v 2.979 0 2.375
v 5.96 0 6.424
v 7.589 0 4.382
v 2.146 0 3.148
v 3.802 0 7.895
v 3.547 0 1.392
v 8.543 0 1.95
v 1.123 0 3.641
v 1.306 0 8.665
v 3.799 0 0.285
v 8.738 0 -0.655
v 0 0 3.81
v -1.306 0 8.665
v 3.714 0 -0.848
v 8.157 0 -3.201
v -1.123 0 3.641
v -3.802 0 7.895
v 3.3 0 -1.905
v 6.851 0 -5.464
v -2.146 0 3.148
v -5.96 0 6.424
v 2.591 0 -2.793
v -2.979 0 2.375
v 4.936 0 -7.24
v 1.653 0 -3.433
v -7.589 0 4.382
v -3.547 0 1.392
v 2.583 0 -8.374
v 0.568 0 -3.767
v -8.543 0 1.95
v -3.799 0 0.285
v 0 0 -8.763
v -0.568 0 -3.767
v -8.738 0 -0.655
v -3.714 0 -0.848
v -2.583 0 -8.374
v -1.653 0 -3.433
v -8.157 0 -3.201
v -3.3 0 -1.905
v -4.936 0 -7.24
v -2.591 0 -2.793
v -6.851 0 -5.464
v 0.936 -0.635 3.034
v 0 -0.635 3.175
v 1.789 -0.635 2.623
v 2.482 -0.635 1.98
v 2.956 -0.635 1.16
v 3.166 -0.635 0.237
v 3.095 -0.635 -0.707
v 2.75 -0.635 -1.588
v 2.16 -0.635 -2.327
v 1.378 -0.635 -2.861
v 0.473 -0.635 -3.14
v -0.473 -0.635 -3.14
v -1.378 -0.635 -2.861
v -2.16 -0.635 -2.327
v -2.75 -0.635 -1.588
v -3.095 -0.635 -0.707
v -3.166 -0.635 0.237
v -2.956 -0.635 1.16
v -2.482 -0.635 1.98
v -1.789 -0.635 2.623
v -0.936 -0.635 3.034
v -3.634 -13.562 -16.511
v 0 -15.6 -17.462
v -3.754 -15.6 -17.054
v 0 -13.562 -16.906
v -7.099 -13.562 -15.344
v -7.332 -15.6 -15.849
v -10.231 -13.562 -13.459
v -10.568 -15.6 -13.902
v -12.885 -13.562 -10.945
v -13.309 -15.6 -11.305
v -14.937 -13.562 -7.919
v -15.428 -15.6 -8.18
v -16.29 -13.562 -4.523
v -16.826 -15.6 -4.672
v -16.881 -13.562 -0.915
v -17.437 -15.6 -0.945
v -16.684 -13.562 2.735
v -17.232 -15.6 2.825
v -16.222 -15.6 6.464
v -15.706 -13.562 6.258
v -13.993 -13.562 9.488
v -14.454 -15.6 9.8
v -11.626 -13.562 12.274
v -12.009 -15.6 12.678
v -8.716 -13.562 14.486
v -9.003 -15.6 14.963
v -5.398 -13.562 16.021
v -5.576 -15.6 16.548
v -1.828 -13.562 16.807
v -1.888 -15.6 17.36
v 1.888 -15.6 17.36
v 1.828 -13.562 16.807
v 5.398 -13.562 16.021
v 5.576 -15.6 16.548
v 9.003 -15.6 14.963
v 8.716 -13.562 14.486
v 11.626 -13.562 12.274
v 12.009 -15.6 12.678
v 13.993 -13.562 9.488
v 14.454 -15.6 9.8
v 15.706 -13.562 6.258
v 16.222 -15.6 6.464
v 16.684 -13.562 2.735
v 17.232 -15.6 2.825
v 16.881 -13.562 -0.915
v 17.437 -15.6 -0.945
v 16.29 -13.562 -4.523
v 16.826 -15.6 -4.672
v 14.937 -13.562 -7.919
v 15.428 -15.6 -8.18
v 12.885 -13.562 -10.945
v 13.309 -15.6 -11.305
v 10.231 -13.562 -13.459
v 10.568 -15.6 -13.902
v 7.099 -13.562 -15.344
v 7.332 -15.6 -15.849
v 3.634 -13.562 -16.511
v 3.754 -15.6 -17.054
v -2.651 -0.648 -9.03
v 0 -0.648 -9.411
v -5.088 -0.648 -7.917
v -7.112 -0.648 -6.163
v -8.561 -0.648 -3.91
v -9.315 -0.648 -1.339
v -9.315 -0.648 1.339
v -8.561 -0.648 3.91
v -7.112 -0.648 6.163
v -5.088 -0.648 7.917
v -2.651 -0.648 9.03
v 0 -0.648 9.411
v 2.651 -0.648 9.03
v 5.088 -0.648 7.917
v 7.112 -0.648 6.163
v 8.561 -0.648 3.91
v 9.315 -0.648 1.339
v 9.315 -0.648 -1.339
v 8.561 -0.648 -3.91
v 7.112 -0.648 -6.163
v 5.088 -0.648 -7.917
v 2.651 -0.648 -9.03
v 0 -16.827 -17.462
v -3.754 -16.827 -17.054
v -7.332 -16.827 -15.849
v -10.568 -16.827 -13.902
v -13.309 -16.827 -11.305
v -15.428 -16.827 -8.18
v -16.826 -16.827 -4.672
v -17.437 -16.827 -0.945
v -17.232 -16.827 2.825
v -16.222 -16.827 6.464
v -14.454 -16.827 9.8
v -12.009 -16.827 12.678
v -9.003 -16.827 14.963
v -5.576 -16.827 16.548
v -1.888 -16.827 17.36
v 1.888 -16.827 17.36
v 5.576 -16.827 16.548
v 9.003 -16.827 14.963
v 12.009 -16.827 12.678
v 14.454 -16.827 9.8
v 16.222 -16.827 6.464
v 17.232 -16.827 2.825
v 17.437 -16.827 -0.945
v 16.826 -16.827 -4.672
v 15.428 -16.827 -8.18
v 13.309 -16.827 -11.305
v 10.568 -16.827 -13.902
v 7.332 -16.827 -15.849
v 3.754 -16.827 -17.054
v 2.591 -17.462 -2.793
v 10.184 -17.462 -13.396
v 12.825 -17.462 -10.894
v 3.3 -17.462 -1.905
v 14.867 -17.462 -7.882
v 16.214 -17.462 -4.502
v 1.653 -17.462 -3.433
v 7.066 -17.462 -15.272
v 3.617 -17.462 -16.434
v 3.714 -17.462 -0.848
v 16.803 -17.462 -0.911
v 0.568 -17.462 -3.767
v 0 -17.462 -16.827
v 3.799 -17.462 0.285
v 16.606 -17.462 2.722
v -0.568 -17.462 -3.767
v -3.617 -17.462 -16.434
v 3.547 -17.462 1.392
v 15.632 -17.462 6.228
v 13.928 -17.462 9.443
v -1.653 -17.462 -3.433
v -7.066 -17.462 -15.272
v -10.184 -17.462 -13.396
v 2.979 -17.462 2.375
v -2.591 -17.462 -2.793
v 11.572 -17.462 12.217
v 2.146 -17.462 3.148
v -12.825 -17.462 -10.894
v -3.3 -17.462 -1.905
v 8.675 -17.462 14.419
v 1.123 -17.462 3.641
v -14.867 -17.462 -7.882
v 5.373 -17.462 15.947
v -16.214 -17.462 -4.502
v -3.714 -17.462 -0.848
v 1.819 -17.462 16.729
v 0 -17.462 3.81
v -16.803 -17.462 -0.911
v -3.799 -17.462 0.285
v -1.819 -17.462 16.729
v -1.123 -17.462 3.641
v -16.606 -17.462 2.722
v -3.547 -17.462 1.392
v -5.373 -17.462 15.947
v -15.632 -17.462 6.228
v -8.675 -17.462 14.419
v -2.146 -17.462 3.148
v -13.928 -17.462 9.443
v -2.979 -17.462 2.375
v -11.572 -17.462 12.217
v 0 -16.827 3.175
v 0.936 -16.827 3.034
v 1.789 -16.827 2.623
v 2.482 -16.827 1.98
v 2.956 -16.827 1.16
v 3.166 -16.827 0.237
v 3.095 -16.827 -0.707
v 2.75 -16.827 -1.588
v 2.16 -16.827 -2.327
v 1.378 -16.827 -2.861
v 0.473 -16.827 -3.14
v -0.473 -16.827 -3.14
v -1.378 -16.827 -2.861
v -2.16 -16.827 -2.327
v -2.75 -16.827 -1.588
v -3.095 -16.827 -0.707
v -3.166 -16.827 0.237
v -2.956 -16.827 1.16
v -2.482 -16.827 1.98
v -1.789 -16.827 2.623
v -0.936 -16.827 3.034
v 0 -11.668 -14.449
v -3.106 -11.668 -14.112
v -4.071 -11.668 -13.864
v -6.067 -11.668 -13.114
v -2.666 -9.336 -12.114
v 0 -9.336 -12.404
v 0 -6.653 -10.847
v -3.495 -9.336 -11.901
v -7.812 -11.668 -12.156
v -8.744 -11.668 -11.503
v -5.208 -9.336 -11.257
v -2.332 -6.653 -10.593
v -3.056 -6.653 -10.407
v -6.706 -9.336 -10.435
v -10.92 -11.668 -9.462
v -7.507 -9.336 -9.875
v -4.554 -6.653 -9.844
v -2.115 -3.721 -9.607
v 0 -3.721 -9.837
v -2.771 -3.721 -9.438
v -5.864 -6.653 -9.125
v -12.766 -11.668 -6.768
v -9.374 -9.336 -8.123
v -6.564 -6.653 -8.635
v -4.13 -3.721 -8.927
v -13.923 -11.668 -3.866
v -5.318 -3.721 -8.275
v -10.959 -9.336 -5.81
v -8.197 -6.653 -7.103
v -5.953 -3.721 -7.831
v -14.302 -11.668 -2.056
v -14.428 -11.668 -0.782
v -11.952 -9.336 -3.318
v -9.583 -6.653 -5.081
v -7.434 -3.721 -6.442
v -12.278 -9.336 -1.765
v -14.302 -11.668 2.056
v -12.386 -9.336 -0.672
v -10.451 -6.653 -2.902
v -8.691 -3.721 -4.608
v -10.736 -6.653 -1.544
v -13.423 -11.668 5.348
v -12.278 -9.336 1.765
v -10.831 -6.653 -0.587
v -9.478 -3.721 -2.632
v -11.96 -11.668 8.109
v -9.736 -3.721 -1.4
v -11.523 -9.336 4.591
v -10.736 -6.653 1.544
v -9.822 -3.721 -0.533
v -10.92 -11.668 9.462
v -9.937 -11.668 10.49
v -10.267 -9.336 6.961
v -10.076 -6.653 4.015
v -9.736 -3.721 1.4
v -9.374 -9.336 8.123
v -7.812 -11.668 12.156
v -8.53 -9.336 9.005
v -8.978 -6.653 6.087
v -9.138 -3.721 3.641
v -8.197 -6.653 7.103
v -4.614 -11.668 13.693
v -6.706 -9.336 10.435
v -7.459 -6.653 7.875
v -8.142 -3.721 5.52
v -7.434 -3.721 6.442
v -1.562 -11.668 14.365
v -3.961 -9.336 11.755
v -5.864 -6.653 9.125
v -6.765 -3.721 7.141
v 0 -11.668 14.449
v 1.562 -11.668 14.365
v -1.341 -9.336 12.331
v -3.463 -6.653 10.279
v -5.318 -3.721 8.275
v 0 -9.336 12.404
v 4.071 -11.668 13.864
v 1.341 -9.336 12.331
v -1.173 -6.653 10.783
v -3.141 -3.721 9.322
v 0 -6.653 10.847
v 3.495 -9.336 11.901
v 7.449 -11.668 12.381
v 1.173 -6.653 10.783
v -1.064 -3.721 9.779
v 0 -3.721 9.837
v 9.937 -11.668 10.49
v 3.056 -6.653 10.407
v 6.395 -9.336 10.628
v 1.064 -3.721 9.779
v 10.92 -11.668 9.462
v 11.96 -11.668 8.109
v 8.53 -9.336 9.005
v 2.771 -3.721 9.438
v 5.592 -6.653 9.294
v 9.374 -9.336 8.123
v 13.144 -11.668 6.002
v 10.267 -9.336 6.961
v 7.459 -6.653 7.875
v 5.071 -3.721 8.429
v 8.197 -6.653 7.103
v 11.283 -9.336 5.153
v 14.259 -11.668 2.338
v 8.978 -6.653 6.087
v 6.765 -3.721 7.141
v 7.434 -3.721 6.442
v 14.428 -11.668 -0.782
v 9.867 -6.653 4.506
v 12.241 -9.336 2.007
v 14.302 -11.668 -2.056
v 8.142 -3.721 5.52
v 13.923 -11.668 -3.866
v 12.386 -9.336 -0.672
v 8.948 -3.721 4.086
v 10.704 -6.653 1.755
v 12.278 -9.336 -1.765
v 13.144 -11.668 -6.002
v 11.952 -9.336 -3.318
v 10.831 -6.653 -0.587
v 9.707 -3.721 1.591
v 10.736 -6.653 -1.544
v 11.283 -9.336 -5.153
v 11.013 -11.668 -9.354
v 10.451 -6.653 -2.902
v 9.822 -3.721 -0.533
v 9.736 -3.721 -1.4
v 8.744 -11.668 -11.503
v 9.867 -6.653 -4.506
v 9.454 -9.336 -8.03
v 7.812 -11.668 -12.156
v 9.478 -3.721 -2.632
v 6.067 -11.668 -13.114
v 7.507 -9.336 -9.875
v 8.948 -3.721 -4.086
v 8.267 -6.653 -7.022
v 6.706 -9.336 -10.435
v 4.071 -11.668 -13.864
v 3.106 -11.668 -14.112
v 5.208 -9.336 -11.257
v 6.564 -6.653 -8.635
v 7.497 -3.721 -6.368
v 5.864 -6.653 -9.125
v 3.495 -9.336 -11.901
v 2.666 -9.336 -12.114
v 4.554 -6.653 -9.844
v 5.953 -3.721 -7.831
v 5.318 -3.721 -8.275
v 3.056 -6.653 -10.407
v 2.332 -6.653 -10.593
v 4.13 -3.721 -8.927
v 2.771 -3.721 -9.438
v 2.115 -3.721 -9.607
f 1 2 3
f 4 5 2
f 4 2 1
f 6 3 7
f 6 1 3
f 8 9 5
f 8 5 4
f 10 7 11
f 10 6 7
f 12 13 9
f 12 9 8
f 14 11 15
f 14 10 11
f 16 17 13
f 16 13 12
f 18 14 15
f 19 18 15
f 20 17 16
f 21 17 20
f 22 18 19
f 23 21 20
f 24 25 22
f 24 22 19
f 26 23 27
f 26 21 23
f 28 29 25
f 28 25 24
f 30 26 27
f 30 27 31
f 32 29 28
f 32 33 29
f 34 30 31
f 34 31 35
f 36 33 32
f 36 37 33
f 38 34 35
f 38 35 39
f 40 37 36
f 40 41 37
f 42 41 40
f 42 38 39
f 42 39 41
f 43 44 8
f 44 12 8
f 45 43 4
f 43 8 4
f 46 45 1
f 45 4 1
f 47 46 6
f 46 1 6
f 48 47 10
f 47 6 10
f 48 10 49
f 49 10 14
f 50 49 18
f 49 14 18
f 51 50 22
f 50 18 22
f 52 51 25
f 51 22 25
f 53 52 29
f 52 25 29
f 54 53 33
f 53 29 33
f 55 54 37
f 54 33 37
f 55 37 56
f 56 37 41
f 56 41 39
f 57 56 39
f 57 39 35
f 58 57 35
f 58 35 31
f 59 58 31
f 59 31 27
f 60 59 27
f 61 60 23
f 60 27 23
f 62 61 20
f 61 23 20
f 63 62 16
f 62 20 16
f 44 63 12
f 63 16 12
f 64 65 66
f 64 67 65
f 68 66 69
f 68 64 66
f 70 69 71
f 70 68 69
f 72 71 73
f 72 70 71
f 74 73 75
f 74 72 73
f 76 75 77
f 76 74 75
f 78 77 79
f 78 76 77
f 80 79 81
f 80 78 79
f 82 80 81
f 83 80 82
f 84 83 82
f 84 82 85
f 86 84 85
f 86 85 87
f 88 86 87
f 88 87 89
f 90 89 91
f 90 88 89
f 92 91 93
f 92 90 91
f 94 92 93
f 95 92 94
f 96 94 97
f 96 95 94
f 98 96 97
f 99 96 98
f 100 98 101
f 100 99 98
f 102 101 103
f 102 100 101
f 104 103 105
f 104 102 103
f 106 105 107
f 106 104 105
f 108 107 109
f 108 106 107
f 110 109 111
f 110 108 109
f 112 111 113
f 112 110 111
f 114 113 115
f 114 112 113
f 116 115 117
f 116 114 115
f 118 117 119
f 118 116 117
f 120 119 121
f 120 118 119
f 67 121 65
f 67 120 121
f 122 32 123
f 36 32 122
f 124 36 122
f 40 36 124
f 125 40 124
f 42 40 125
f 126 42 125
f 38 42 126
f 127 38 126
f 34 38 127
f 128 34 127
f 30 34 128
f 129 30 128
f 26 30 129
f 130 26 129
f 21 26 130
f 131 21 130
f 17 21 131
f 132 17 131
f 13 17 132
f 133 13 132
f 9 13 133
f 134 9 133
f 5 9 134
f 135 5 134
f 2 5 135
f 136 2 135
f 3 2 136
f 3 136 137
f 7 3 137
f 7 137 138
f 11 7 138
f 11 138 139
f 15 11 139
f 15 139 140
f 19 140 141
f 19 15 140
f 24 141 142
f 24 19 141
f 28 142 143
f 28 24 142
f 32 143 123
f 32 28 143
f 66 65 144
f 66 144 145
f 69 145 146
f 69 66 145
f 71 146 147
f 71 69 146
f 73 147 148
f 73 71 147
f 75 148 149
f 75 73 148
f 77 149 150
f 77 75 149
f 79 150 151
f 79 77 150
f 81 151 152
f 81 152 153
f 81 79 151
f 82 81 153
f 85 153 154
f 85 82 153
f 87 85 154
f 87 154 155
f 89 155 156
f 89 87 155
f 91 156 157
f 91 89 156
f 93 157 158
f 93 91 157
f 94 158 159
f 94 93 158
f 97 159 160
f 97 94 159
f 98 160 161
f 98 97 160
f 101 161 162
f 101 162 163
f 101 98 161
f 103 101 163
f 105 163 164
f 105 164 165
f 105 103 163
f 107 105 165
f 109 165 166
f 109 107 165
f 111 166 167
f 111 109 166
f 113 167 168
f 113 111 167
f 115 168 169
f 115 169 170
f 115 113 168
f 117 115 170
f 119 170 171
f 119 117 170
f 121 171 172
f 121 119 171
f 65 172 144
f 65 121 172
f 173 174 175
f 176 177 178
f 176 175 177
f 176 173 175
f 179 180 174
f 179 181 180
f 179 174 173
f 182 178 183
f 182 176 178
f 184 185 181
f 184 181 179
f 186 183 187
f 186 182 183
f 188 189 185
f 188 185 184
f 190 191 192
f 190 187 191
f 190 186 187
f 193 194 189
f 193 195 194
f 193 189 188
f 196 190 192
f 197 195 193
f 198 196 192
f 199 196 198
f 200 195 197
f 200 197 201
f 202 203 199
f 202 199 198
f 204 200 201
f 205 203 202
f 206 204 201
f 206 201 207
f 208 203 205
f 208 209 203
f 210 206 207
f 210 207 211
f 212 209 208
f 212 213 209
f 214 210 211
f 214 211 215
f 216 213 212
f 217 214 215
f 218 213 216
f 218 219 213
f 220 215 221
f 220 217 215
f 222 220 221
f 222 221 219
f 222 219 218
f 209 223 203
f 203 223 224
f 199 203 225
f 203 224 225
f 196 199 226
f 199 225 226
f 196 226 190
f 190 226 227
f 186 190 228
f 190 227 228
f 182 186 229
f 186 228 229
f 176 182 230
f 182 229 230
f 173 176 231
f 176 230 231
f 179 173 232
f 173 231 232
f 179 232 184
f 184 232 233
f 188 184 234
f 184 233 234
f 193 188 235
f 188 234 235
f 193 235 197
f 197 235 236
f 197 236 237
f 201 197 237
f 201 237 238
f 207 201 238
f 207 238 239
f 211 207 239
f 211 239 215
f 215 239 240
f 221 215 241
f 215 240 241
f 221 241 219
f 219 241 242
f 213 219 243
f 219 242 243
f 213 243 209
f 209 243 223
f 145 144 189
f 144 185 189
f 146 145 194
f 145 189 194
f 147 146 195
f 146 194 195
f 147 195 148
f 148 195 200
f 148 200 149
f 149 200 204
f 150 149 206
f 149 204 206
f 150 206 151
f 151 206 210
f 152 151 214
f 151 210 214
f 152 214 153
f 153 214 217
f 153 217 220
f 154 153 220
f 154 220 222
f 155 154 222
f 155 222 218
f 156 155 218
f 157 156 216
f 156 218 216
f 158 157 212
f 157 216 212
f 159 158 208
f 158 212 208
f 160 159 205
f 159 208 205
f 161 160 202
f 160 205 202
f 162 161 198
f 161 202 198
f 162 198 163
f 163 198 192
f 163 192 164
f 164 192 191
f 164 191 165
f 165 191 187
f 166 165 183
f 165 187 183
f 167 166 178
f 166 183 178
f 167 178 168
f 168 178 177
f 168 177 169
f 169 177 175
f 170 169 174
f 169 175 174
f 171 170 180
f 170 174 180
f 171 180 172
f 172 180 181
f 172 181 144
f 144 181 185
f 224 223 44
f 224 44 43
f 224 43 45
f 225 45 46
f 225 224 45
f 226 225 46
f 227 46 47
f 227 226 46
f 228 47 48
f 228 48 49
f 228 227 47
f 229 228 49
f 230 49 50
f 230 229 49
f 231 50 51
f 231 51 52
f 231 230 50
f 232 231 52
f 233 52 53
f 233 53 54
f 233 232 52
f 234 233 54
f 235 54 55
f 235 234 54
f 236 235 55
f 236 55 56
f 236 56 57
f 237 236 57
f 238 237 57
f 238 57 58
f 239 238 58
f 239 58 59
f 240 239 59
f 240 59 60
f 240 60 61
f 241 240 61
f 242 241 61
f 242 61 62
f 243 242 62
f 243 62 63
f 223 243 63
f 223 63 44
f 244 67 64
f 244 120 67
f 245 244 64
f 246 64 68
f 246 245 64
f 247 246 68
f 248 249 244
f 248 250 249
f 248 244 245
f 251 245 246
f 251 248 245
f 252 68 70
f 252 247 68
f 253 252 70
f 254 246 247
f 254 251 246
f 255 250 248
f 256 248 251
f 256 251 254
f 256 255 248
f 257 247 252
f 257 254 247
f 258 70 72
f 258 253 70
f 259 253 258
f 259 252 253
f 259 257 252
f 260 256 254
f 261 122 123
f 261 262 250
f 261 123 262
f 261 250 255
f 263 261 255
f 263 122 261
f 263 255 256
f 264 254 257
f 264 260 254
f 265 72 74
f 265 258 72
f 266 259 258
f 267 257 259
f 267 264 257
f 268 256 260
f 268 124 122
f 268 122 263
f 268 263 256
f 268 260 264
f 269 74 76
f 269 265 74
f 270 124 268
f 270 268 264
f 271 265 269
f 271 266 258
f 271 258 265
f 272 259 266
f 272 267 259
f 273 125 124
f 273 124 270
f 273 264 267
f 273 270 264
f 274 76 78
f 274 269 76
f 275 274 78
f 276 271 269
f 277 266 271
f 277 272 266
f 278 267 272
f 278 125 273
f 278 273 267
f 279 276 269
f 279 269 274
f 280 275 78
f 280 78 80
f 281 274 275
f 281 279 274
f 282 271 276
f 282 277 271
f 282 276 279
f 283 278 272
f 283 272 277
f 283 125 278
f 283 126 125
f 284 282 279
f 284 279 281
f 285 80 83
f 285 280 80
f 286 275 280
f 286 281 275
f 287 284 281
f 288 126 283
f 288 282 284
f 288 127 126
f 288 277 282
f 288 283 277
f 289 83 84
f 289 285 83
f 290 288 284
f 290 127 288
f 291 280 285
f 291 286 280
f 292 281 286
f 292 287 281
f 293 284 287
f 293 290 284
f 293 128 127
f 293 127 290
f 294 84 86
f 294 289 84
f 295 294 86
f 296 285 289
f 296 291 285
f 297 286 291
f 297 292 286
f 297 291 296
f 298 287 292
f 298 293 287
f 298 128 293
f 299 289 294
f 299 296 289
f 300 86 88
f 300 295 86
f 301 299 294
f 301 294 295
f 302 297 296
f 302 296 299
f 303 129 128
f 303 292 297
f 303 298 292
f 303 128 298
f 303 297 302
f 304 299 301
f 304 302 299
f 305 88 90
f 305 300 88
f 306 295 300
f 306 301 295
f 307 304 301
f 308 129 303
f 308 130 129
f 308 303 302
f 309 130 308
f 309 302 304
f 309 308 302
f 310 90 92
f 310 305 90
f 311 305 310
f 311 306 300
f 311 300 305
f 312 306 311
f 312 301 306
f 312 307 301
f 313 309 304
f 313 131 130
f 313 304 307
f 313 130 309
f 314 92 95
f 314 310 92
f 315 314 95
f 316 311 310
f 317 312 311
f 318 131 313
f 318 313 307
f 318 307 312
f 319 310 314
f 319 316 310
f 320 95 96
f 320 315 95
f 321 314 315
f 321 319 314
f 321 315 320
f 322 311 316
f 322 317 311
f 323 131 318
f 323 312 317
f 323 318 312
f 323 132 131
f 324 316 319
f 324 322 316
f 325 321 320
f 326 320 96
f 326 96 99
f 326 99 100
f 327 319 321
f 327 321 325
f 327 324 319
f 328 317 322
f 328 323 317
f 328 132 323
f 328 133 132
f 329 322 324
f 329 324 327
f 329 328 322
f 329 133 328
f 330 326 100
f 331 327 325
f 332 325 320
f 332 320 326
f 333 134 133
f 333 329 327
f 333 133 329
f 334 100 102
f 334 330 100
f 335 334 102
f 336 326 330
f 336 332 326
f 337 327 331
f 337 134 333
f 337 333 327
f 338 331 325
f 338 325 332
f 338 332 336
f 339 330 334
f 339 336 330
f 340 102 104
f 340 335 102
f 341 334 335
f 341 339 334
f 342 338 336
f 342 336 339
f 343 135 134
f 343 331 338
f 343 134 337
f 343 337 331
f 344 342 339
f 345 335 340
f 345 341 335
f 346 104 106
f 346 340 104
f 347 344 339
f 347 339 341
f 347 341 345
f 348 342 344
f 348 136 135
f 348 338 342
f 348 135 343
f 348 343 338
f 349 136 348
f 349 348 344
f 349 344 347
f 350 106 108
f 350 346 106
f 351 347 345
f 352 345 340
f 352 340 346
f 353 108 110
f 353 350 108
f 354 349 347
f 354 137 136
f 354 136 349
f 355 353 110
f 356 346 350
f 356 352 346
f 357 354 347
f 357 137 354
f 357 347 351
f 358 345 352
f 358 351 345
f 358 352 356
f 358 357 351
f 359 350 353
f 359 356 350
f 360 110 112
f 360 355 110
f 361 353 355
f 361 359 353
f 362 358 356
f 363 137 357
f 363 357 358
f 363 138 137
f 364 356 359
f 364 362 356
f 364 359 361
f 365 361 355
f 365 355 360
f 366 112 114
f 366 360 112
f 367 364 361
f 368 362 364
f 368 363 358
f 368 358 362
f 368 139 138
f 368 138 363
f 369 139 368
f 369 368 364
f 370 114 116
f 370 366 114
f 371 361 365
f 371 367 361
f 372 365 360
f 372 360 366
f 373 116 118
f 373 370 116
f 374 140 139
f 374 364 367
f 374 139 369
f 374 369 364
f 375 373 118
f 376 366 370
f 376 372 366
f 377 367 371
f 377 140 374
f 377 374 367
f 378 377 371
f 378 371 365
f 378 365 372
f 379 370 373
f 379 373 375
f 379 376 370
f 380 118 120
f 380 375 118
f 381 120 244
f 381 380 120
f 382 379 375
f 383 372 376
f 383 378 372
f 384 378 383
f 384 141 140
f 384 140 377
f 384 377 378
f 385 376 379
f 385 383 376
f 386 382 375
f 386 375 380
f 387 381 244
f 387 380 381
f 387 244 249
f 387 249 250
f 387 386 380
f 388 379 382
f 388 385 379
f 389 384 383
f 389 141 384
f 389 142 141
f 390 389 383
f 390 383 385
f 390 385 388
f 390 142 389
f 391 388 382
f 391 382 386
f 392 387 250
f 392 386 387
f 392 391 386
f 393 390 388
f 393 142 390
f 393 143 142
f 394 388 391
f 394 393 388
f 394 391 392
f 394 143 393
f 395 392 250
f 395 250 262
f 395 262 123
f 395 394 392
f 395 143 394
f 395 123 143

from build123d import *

# Parameters (mm, degrees)
CUT_EXTRUDE1_DEPTH      = 31.245937227
CUT_EXTRUDE1_DEPTH_BACK = 31.245937227
SKETCH2_R               = 3.175
CHAMFER1_SIZE           = 0.635
CHAMFER1_SIZE_2         = 1.705739105


with BuildPart() as part:
    # Sketch1 → Revolve1 (revolve)
    with BuildSketch(Plane.XY, mode=Mode.PRIVATE) as revolve1_sk:
        with BuildLine():
            Line((17.4625, -17.4625), (17.4625, -13.894606786))
            ThreePointArc((17.4625, -13.894606786), (11.560204499, -8.032687253), (9.398, 0))
            Line((9.398, 0), (0, 0))
            Line((0, 0), (0, -17.4625))
            Line((0, -17.4625), (17.4625, -17.4625))
        make_face()
    revolve(revolve1_sk.sketch.rotate(Axis((0, 0, 0), (0, 1, 0)), 90), axis=Axis((0, 0, 0), (0, 1, 0)))

    # Sketch2 → Cut-Extrude1 (cut, two sides: drawn at the far end of the back side and taken through both)
    with BuildSketch(Plane(origin=(0, 0, 0), x_dir=(1, 0, 0), z_dir=(0, 1, 0)).offset(-CUT_EXTRUDE1_DEPTH_BACK)):
        with Locations(Location((0, 0, 0), (0, 0, 270))):
            Circle(SKETCH2_R)
    extrude(amount=CUT_EXTRUDE1_DEPTH + CUT_EXTRUDE1_DEPTH_BACK, mode=Mode.SUBTRACT)

    # Chamfer1
    # the kernel refuses this chamfer: 1.705739105, 0.635 mm, written as the material it takes off along each edge
    with BuildSketch(Plane(origin=(0, 0, 0), x_dir=(0, 0, 1), z_dir=(-1, 0, 0))) as chamfer1_piece_1:
        Polygon((3.175, -CHAMFER1_SIZE), (3.175 + CHAMFER1_SIZE, 0), (3.175, 0), align=None)
    revolve(axis=Axis((0, 0, 0), (0, 1, 0)), mode=Mode.SUBTRACT)
    with BuildSketch(Plane(origin=(0, -17.4625, 0), x_dir=(0, 0, 1), z_dir=(-1, 0, 0))) as chamfer1_piece_2:
        Polygon((3.175 + CHAMFER1_SIZE, 0), (3.175, CHAMFER1_SIZE), (3.175, 0), align=None)
    revolve(axis=Axis((0, -17.4625, 0), (0, 1, 0)), mode=Mode.SUBTRACT)
    with BuildSketch(Plane(origin=(0, -17.4625, 0), x_dir=(0, 0, -1), z_dir=(1, 0, 0))) as chamfer1_piece_3:
        Polygon((17.4625, CHAMFER1_SIZE), (17.4625 - CHAMFER1_SIZE, 0), (17.4625, 0), align=None)
    revolve(axis=Axis((0, -17.4625, 0), (0, 1, 0)), mode=Mode.SUBTRACT)
    with BuildSketch(Plane(origin=(0, 0, 0), x_dir=(0, 0, -1), z_dir=(1, 0, 0))) as chamfer1_piece_4:
        with BuildLine():
            Line((9.411131055, -0.648131055), (9.398 - CHAMFER1_SIZE, 0))
            Line((9.398 - CHAMFER1_SIZE, 0), (9.398, 0))
            ThreePointArc((9.398, 0), (9.401471415, -0.333297329), (9.411131055, -0.648131055))
        make_face()
    revolve(axis=Axis((0, 0, 0), (0, 1, 0)), mode=Mode.SUBTRACT)
    with BuildSketch(Plane(origin=(0, -13.894606786, 0), x_dir=(0, 0, -1), z_dir=(1, 0, 0))) as chamfer1_piece_5:
        with BuildLine():
            Line((17.4625, -CHAMFER1_SIZE_2), (16.906238382, 0.332895332))
            ThreePointArc((16.906238382, 0.332895332), (17.161543174, 0.176303935), (17.4625, 0))
            Line((17.4625, 0), (17.4625, -CHAMFER1_SIZE_2))
        make_face()
    revolve(axis=Axis((0, -13.894606786, 0), (0, 1, 0)), mode=Mode.SUBTRACT)


solid = part.part
